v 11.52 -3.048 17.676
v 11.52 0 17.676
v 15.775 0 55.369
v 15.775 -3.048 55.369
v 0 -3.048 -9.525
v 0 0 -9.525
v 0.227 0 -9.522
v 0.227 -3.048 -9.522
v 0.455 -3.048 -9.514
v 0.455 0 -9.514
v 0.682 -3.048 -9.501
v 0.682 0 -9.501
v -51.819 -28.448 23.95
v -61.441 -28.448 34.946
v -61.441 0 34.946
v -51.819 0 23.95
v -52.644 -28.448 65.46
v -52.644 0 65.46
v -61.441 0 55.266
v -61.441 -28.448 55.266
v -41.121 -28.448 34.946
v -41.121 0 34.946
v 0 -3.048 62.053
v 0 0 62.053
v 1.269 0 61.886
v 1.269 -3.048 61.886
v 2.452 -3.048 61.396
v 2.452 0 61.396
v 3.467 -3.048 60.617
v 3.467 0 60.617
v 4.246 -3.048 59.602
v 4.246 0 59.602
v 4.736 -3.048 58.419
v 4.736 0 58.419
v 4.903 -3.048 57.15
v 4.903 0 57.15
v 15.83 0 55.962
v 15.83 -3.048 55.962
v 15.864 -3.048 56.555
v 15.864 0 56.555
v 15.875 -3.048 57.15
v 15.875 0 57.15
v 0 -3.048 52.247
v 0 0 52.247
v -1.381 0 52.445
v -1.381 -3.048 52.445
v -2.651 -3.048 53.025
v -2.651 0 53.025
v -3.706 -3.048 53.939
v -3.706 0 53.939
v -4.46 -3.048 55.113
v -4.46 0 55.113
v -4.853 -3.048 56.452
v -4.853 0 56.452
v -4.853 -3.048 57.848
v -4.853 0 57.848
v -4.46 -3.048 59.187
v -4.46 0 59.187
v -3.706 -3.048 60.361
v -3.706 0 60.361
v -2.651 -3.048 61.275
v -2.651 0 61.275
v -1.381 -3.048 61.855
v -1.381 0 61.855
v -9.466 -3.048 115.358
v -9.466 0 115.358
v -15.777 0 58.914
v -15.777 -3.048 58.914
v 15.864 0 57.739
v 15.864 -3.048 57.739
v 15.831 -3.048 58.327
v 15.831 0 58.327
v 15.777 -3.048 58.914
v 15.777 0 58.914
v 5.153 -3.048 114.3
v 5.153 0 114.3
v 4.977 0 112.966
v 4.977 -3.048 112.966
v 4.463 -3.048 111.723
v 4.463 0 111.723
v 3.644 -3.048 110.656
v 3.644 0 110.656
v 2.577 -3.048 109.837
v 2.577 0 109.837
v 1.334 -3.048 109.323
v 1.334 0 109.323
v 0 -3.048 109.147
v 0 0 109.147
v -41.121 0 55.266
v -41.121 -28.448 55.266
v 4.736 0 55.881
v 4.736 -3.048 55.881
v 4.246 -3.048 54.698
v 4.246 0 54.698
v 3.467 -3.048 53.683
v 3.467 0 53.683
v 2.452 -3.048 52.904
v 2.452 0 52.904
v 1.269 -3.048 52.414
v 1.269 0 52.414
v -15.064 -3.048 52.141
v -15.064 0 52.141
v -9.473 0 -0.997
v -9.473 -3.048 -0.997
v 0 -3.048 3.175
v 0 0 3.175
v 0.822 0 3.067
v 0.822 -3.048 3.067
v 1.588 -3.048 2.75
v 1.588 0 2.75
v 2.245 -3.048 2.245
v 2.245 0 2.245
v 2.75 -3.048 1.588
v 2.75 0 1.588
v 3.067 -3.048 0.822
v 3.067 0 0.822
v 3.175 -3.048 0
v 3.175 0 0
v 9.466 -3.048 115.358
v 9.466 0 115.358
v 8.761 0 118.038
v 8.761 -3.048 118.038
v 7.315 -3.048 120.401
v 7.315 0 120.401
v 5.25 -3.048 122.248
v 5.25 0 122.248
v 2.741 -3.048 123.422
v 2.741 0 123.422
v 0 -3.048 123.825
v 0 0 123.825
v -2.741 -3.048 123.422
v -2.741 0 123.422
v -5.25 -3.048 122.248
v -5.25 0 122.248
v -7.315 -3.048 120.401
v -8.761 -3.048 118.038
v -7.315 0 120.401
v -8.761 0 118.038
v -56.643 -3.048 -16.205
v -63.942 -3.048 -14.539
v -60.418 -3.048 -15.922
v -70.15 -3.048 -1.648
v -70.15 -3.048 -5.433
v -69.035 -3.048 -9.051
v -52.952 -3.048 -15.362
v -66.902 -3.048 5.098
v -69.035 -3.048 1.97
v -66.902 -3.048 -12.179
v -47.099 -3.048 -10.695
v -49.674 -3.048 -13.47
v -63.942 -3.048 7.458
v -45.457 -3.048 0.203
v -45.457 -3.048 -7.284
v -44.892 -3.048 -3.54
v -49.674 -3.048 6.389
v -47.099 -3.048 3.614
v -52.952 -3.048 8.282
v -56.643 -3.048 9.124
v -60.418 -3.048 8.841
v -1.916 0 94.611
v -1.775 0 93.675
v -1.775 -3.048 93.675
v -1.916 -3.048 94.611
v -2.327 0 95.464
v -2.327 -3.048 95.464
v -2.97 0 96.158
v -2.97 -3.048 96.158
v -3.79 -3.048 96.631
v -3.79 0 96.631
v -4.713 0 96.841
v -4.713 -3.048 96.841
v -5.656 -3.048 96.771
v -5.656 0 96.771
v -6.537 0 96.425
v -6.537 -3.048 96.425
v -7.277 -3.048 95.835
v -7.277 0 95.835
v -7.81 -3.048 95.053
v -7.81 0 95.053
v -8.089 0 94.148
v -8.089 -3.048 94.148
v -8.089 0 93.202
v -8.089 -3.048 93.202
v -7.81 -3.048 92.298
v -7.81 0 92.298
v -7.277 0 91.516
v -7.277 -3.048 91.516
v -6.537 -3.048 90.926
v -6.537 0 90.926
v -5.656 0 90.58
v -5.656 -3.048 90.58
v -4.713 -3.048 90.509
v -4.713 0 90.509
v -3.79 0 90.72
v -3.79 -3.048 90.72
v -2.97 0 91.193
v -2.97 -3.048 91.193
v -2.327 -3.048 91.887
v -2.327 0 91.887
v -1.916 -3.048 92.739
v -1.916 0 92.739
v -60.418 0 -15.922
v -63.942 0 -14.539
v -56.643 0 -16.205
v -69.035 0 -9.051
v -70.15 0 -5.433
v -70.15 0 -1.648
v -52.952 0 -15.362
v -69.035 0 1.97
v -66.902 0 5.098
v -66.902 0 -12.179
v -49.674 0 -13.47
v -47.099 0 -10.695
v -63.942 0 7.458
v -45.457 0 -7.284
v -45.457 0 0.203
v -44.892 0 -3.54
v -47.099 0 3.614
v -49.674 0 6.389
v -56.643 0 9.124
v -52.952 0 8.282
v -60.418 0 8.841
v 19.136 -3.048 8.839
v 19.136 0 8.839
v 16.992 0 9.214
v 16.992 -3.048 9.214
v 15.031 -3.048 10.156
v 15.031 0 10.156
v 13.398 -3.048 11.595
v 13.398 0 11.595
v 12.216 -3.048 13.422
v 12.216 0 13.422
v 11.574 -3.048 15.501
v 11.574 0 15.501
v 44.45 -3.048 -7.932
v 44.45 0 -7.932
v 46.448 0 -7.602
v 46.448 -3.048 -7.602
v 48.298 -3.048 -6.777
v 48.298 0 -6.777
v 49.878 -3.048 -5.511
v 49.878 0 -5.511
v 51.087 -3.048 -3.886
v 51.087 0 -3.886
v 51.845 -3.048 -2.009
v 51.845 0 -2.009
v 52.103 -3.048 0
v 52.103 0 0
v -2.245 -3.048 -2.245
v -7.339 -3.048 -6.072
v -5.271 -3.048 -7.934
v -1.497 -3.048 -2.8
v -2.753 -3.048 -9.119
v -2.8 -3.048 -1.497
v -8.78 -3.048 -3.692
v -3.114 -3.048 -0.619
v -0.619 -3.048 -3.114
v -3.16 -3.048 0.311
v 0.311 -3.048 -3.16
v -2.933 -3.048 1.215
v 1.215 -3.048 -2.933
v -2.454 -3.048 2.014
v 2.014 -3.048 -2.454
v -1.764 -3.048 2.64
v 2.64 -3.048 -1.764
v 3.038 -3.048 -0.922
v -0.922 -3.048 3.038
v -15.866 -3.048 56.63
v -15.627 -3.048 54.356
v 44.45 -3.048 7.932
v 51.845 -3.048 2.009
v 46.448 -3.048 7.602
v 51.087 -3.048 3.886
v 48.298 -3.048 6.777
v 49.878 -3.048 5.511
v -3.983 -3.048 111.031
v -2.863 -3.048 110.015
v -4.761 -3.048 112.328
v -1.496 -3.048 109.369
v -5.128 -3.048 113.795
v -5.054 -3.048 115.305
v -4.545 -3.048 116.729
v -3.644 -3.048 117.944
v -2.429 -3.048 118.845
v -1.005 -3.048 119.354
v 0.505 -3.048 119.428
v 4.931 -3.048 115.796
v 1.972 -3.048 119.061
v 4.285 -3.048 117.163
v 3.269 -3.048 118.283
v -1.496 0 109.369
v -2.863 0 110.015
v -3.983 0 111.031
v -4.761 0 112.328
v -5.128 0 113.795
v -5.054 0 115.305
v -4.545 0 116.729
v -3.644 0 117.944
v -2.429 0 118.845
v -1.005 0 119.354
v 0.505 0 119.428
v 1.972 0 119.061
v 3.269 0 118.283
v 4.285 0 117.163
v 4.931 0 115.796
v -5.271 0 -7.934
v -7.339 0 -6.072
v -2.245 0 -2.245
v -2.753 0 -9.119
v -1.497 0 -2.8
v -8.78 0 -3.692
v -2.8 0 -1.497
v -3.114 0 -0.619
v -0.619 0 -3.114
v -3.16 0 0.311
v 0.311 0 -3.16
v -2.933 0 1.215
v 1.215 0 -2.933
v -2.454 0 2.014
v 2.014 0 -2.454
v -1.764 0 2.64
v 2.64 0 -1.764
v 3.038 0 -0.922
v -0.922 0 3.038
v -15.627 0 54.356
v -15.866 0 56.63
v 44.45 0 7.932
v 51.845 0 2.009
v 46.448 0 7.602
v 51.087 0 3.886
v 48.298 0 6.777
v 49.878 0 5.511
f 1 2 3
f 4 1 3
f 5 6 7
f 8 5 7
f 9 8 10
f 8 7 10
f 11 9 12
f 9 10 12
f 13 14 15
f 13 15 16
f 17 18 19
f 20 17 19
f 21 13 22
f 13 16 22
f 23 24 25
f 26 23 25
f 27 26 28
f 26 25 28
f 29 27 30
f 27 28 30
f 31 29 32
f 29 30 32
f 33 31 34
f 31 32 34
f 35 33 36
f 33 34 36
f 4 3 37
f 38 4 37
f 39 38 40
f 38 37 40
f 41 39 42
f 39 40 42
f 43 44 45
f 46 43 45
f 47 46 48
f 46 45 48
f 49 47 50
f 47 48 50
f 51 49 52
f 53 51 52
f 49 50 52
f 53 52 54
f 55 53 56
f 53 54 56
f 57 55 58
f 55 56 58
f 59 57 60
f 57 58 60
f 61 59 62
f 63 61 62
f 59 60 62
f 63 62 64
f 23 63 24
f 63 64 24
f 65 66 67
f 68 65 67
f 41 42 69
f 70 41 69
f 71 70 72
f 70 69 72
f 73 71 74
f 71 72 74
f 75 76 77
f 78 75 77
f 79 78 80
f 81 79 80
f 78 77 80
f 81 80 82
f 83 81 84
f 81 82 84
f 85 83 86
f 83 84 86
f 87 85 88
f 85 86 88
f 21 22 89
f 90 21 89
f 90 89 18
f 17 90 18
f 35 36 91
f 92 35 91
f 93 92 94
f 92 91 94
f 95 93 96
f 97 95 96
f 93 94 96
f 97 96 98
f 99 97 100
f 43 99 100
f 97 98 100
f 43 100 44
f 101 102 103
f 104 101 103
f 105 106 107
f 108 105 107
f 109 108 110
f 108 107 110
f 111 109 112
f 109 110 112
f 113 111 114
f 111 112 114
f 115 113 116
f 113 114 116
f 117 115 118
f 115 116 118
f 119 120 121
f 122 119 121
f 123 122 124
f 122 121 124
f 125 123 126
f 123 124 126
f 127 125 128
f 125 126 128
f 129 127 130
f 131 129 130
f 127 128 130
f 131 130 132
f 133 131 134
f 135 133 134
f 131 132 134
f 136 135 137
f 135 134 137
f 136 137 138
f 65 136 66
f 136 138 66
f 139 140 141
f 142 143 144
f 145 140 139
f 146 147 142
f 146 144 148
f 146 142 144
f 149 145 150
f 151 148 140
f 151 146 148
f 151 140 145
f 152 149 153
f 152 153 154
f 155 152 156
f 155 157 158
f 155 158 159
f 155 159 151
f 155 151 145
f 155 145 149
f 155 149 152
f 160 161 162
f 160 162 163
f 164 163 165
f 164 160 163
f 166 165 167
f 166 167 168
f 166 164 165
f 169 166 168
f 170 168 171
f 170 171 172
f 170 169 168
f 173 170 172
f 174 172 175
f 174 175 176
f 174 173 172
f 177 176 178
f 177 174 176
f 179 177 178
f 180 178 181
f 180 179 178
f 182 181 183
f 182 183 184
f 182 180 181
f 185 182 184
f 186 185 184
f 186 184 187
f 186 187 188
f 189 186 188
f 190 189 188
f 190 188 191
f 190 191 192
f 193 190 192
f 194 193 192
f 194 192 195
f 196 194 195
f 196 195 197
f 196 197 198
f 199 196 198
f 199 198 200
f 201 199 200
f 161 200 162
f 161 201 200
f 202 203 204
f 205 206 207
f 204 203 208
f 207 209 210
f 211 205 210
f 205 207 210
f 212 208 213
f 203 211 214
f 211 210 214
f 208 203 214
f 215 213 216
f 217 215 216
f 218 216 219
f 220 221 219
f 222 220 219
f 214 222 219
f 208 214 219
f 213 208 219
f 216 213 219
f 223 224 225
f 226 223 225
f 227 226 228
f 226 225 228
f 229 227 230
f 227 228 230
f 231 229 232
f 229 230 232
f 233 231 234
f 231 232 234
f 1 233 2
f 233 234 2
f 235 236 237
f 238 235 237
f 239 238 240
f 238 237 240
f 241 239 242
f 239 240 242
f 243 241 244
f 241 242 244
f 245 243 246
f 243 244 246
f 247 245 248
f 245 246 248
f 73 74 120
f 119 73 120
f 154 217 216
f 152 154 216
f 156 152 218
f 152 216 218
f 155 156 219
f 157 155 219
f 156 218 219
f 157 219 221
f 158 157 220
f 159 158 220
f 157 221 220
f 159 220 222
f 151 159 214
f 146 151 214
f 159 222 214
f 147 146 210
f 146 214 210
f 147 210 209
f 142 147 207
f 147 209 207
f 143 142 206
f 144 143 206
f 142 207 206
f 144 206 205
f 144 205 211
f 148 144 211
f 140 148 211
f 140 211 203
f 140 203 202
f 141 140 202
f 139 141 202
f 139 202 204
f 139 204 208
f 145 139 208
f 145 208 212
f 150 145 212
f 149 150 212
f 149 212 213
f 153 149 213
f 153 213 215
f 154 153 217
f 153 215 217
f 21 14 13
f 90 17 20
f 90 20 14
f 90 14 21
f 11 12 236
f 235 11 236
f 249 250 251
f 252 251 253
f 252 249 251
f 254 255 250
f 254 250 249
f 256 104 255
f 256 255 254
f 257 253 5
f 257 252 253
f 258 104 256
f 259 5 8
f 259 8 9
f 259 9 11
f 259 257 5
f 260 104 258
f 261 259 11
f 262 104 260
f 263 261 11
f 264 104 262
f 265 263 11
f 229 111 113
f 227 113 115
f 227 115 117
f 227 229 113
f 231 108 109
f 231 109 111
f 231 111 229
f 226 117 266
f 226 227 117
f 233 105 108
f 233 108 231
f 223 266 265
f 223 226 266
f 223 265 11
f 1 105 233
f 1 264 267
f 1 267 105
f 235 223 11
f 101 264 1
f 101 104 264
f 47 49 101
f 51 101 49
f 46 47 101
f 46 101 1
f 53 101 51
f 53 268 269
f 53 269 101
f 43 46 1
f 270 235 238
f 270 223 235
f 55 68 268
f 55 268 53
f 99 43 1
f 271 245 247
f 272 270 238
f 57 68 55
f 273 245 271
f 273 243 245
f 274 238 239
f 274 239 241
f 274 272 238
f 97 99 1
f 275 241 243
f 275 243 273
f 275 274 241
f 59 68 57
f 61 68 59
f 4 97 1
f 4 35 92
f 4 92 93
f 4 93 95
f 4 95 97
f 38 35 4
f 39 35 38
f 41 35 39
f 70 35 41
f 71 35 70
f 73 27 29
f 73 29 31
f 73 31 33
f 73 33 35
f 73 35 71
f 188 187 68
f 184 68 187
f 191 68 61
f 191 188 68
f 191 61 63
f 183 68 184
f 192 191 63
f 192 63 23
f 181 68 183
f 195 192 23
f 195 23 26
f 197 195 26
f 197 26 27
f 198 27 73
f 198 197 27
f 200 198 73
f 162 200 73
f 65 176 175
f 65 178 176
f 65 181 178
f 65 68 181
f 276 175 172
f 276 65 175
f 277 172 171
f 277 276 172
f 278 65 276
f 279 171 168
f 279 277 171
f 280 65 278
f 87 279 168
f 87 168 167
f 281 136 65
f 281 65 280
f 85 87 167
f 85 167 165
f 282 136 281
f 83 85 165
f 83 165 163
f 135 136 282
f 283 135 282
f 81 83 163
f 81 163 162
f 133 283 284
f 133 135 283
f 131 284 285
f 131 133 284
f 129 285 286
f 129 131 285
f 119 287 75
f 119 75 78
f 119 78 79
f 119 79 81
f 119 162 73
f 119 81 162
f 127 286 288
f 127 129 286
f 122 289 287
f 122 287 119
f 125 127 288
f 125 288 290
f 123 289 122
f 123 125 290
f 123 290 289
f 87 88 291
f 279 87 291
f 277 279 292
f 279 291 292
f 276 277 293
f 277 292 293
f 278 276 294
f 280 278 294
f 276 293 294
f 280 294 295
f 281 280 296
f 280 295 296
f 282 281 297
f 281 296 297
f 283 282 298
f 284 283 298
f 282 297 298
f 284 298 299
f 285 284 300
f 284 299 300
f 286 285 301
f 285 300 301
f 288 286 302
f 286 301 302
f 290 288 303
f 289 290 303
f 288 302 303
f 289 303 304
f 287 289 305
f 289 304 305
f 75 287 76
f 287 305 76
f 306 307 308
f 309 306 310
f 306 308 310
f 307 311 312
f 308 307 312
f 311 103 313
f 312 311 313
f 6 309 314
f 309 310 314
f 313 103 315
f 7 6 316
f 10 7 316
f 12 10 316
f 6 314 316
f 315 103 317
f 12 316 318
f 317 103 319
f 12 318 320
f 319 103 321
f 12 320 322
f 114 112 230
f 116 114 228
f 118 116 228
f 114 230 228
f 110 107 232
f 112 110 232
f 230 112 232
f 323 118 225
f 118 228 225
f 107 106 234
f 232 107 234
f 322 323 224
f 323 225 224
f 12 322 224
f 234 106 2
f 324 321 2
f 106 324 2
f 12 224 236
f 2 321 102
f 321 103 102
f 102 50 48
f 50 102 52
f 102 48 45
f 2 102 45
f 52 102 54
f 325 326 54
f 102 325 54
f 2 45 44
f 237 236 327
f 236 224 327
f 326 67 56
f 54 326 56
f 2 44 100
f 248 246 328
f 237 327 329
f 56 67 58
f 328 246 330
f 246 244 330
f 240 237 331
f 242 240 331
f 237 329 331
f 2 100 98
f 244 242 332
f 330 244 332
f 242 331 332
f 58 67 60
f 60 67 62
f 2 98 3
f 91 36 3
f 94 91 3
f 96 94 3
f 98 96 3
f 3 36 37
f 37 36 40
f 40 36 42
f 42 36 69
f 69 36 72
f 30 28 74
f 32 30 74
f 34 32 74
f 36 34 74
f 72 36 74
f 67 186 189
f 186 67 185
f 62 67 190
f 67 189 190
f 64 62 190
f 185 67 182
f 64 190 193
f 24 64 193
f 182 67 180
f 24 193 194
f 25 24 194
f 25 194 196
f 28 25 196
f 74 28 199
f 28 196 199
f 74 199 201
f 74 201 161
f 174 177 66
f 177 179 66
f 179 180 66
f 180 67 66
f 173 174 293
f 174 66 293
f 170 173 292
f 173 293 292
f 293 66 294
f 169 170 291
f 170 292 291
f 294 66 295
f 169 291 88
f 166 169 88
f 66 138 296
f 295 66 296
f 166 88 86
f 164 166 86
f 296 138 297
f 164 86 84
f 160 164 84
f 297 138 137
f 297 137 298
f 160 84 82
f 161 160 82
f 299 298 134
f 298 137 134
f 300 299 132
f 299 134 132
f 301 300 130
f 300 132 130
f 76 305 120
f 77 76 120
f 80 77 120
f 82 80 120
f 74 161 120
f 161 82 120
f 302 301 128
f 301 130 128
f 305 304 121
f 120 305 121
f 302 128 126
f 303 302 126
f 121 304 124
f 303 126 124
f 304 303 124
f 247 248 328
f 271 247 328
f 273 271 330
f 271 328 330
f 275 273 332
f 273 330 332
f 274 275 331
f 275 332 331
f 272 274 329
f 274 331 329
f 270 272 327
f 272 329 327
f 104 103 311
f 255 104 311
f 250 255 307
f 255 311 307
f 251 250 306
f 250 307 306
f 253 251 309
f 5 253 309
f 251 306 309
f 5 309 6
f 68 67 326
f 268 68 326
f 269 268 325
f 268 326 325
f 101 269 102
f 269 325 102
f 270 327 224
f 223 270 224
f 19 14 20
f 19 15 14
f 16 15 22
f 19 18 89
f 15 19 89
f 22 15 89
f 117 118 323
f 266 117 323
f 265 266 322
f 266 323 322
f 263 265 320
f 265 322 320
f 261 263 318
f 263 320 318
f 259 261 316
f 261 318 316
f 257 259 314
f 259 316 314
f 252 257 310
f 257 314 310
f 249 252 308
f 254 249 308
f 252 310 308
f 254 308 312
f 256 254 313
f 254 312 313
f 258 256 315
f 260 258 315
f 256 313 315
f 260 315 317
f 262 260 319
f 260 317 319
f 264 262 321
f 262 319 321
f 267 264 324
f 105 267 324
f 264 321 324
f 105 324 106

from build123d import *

# Parameters (mm, degrees)
F0_R     = 3.175
F1_DEPTH = 3.048
F0_W     = 20.32
F0_H     = 20.32
F0_R_2   = 12.7
F2_DEPTH = 25.4


with BuildPart() as f1:
    # F0 (on Front) → F1 (new body)
    with BuildSketch(Plane.XZ):
        with BuildLine():
            ThreePointArc((-9.4660211047, 115.3583333333), (-7.0995158286, 107.95), (0, 104.775))
            ThreePointArc((0, 104.775), (6.7351920908, 107.5648079092), (9.525, 114.3))
            ThreePointArc((9.525, 114.3), (9.5102438461, 114.829987725), (9.4660211047, 115.3583333333))
            ThreePointArc((9.4660211047, 115.3583333333), (0, 123.825), (-9.4660211047, 115.3583333333))
        make_face()
        with BuildLine():
            ThreePointArc((5.1530471268, 114.3), (3.6437545671, 110.6562454329), (0, 109.1469528732))
            ThreePointArc((0, 109.1469528732), (-3.6437545671, 117.9437545671), (5.1530471268, 114.3))
        make_face(mode=Mode.SUBTRACT)
        with BuildLine():
            ThreePointArc((9.525, 114.3), (6.7351920908, 107.5648079092), (0, 104.775))
            Line((0, 104.775), (0, 73.025))
            ThreePointArc((0, 73.025), (10.5833333333, 68.9825263809), (15.7767018412, 58.9138888889))
            Line((15.7767018412, 58.9138888889), (9.4660211047, 115.3583333333))
            ThreePointArc((9.4660211047, 115.3583333333), (9.5102438461, 114.829987725), (9.525, 114.3))
        make_face()
        with BuildLine():
            Line((0, 73.025), (0, 104.775))
            ThreePointArc((0, 104.775), (-7.0995158286, 107.95), (-9.4660211047, 115.3583333333))
            Line((-9.4660211047, 115.3583333333), (-15.7767018412, 58.9138888889))
            ThreePointArc((-15.7767018412, 58.9138888889), (-10.5833333333, 68.9825263809), (0, 73.025))
        make_face()
        with Locations((-4.9498714507, 93.6752)):
            Circle(F0_R, mode=Mode.SUBTRACT)
        with BuildLine():
            ThreePointArc((15.7767018412, 58.9138888889), (10.5833333333, 68.9825263809), (0, 73.025))
            Line((0, 73.025), (0, 62.0531648727))
            ThreePointArc((0, 62.0531648727), (3.4670611307, 60.6170611307), (4.9031648727, 57.15))
            ThreePointArc((4.9031648727, 57.15), (3.4670611307, 53.6829388693), (0, 52.2468351273))
            Line((0, 52.2468351273), (0, 41.275))
            ThreePointArc((0, 41.275), (10.5770706221, 45.3118750617), (15.7748262685, 55.3694154892))
            ThreePointArc((15.7748262685, 55.3694154892), (15.8499367824, 56.2582999416), (15.875, 57.15))
            ThreePointArc((15.875, 57.15), (15.8504064101, 58.033312875), (15.7767018412, 58.9138888889))
        make_face()
        with BuildLine():
            Line((0, 62.0531648727), (0, 73.025))
            ThreePointArc((0, 73.025), (-10.5833333333, 68.9825263809), (-15.7767018412, 58.9138888889))
            Line((-15.7767018412, 58.9138888889), (-15.0640300879, 52.1409459466))
            ThreePointArc((-15.0640300879, 52.1409459466), (-9.287004143, 44.2749396487), (0, 41.275))
            Line((0, 41.275), (0, 52.2468351273))
            ThreePointArc((0, 52.2468351273), (-4.9031648727, 57.15), (0, 62.0531648727))
        make_face()
        with BuildLine():
            Line((-15.0640300879, 52.1409459466), (-15.7767018412, 58.9138888889))
            ThreePointArc((-15.7767018412, 58.9138888889), (-15.7878394819, 55.4887506228), (-15.0640300879, 52.1409459466))
        make_face()
        with BuildLine():
            ThreePointArc((0, 41.275), (-9.287004143, 44.2749396487), (-15.0640300879, 52.1409459466))
            Line((-15.0640300879, 52.1409459466), (-9.4727036892, -0.9967496263))
            ThreePointArc((-9.4727036892, -0.9967496263), (-7.0788298889, 6.3730520479), (0, 9.525))
            Line((0, 9.525), (0, 41.275))
        make_face()
        with BuildLine():
            ThreePointArc((15.7748262685, 55.3694154892), (10.5770706221, 45.3118750617), (0, 41.275))
            Line((0, 41.275), (0, 9.525))
            ThreePointArc((0, 9.525), (6.7351920908, 6.7351920908), (9.525, 0))
            ThreePointArc((9.525, 0), (6.9720323139, -6.4897142013), (0.6816634301, -9.5005768229))
            Line((0.6816634301, -9.5005768229), (44.45, -7.9324102062))
            ThreePointArc((44.45, -7.9324102062), (36.2282913266, 0), (44.45, 7.9324102062))
            Line((44.45, 7.9324102062), (19.1355733941, 8.8393955256))
            ThreePointArc((19.1355733941, 8.8393955256), (13.3978074442, 11.5945048447), (11.5202038062, 17.6762143112))
            Line((11.5202038062, 17.6762143112), (15.7748262685, 55.3694154892))
        make_face()
        with BuildLine():
            ThreePointArc((0, 9.525), (-7.0788298889, 6.3730520479), (-9.4727036892, -0.9967496263))
            ThreePointArc((-9.4727036892, -0.9967496263), (-6.3730520479, -7.0788298889), (0, -9.525))
            Line((0, -9.525), (0.6816634301, -9.5005768229))
            ThreePointArc((0.6816634301, -9.5005768229), (6.9720323139, -6.4897142013), (9.525, 0))
            ThreePointArc((9.525, 0), (6.7351920908, 6.7351920908), (0, 9.525))
        make_face()
        with BuildLine():
            ThreePointArc((3.175, 0), (-2.2450640303, -2.2450640303), (0, 3.175))
            ThreePointArc((0, 3.175), (2.2450640303, 2.2450640303), (3.175, 0))
        make_face(mode=Mode.SUBTRACT)
        with BuildLine():
            Line((0.6816634301, -9.5005768229), (0, -9.525))
            ThreePointArc((0, -9.525), (0.3410504081, -9.5188922475), (0.6816634301, -9.5005768229))
        make_face()
        with BuildLine():
            ThreePointArc((52.1032913266, 0), (49.8780506254, 5.5112611943), (44.45, 7.9324102062))
            ThreePointArc((44.45, 7.9324102062), (36.2282913266, 0), (44.45, -7.9324102062))
            ThreePointArc((44.45, -7.9324102062), (49.8780506254, -5.5112611943), (52.1032913266, 0))
        make_face()
    extrude(amount=F1_DEPTH)


with BuildPart() as f1b:
    # F0 (on Front) → F1, piece 2 (new body)
    with BuildSketch(Plane.XZ):
        Polygon((-52.6440143585, 65.4603764415), (-61.4409260452, 55.2660877478), (-41.1209260452, 55.2660877478), align=None)
        with Locations((-51.2809260452, 45.1060877478)):
            Rectangle(F0_W, F0_H)
        Polygon((-41.1209260452, 34.9460877478), (-61.4409260452, 34.9460877478), (-51.8193021417, 23.9499509335), align=None)
    extrude(amount=F1_DEPTH)

    # F2 (add): a face of the model
    f2_faces = [f1b.faces().sort_by_distance(p)[0] for p in [
        (-51.3877546431, -3.048, 44.8827250411),
    ]]
    extrude(f2_faces, amount=F2_DEPTH)


with BuildPart() as f1c:
    # F0 (on Front) → F1, piece 3 (new body)
    with BuildSketch(Plane.XZ):
        with Locations((-57.5922764838, -3.5403952934)):
            Circle(F0_R_2)
    extrude(amount=F1_DEPTH)


solid = Compound([f1.part, f1b.part, f1c.part])
